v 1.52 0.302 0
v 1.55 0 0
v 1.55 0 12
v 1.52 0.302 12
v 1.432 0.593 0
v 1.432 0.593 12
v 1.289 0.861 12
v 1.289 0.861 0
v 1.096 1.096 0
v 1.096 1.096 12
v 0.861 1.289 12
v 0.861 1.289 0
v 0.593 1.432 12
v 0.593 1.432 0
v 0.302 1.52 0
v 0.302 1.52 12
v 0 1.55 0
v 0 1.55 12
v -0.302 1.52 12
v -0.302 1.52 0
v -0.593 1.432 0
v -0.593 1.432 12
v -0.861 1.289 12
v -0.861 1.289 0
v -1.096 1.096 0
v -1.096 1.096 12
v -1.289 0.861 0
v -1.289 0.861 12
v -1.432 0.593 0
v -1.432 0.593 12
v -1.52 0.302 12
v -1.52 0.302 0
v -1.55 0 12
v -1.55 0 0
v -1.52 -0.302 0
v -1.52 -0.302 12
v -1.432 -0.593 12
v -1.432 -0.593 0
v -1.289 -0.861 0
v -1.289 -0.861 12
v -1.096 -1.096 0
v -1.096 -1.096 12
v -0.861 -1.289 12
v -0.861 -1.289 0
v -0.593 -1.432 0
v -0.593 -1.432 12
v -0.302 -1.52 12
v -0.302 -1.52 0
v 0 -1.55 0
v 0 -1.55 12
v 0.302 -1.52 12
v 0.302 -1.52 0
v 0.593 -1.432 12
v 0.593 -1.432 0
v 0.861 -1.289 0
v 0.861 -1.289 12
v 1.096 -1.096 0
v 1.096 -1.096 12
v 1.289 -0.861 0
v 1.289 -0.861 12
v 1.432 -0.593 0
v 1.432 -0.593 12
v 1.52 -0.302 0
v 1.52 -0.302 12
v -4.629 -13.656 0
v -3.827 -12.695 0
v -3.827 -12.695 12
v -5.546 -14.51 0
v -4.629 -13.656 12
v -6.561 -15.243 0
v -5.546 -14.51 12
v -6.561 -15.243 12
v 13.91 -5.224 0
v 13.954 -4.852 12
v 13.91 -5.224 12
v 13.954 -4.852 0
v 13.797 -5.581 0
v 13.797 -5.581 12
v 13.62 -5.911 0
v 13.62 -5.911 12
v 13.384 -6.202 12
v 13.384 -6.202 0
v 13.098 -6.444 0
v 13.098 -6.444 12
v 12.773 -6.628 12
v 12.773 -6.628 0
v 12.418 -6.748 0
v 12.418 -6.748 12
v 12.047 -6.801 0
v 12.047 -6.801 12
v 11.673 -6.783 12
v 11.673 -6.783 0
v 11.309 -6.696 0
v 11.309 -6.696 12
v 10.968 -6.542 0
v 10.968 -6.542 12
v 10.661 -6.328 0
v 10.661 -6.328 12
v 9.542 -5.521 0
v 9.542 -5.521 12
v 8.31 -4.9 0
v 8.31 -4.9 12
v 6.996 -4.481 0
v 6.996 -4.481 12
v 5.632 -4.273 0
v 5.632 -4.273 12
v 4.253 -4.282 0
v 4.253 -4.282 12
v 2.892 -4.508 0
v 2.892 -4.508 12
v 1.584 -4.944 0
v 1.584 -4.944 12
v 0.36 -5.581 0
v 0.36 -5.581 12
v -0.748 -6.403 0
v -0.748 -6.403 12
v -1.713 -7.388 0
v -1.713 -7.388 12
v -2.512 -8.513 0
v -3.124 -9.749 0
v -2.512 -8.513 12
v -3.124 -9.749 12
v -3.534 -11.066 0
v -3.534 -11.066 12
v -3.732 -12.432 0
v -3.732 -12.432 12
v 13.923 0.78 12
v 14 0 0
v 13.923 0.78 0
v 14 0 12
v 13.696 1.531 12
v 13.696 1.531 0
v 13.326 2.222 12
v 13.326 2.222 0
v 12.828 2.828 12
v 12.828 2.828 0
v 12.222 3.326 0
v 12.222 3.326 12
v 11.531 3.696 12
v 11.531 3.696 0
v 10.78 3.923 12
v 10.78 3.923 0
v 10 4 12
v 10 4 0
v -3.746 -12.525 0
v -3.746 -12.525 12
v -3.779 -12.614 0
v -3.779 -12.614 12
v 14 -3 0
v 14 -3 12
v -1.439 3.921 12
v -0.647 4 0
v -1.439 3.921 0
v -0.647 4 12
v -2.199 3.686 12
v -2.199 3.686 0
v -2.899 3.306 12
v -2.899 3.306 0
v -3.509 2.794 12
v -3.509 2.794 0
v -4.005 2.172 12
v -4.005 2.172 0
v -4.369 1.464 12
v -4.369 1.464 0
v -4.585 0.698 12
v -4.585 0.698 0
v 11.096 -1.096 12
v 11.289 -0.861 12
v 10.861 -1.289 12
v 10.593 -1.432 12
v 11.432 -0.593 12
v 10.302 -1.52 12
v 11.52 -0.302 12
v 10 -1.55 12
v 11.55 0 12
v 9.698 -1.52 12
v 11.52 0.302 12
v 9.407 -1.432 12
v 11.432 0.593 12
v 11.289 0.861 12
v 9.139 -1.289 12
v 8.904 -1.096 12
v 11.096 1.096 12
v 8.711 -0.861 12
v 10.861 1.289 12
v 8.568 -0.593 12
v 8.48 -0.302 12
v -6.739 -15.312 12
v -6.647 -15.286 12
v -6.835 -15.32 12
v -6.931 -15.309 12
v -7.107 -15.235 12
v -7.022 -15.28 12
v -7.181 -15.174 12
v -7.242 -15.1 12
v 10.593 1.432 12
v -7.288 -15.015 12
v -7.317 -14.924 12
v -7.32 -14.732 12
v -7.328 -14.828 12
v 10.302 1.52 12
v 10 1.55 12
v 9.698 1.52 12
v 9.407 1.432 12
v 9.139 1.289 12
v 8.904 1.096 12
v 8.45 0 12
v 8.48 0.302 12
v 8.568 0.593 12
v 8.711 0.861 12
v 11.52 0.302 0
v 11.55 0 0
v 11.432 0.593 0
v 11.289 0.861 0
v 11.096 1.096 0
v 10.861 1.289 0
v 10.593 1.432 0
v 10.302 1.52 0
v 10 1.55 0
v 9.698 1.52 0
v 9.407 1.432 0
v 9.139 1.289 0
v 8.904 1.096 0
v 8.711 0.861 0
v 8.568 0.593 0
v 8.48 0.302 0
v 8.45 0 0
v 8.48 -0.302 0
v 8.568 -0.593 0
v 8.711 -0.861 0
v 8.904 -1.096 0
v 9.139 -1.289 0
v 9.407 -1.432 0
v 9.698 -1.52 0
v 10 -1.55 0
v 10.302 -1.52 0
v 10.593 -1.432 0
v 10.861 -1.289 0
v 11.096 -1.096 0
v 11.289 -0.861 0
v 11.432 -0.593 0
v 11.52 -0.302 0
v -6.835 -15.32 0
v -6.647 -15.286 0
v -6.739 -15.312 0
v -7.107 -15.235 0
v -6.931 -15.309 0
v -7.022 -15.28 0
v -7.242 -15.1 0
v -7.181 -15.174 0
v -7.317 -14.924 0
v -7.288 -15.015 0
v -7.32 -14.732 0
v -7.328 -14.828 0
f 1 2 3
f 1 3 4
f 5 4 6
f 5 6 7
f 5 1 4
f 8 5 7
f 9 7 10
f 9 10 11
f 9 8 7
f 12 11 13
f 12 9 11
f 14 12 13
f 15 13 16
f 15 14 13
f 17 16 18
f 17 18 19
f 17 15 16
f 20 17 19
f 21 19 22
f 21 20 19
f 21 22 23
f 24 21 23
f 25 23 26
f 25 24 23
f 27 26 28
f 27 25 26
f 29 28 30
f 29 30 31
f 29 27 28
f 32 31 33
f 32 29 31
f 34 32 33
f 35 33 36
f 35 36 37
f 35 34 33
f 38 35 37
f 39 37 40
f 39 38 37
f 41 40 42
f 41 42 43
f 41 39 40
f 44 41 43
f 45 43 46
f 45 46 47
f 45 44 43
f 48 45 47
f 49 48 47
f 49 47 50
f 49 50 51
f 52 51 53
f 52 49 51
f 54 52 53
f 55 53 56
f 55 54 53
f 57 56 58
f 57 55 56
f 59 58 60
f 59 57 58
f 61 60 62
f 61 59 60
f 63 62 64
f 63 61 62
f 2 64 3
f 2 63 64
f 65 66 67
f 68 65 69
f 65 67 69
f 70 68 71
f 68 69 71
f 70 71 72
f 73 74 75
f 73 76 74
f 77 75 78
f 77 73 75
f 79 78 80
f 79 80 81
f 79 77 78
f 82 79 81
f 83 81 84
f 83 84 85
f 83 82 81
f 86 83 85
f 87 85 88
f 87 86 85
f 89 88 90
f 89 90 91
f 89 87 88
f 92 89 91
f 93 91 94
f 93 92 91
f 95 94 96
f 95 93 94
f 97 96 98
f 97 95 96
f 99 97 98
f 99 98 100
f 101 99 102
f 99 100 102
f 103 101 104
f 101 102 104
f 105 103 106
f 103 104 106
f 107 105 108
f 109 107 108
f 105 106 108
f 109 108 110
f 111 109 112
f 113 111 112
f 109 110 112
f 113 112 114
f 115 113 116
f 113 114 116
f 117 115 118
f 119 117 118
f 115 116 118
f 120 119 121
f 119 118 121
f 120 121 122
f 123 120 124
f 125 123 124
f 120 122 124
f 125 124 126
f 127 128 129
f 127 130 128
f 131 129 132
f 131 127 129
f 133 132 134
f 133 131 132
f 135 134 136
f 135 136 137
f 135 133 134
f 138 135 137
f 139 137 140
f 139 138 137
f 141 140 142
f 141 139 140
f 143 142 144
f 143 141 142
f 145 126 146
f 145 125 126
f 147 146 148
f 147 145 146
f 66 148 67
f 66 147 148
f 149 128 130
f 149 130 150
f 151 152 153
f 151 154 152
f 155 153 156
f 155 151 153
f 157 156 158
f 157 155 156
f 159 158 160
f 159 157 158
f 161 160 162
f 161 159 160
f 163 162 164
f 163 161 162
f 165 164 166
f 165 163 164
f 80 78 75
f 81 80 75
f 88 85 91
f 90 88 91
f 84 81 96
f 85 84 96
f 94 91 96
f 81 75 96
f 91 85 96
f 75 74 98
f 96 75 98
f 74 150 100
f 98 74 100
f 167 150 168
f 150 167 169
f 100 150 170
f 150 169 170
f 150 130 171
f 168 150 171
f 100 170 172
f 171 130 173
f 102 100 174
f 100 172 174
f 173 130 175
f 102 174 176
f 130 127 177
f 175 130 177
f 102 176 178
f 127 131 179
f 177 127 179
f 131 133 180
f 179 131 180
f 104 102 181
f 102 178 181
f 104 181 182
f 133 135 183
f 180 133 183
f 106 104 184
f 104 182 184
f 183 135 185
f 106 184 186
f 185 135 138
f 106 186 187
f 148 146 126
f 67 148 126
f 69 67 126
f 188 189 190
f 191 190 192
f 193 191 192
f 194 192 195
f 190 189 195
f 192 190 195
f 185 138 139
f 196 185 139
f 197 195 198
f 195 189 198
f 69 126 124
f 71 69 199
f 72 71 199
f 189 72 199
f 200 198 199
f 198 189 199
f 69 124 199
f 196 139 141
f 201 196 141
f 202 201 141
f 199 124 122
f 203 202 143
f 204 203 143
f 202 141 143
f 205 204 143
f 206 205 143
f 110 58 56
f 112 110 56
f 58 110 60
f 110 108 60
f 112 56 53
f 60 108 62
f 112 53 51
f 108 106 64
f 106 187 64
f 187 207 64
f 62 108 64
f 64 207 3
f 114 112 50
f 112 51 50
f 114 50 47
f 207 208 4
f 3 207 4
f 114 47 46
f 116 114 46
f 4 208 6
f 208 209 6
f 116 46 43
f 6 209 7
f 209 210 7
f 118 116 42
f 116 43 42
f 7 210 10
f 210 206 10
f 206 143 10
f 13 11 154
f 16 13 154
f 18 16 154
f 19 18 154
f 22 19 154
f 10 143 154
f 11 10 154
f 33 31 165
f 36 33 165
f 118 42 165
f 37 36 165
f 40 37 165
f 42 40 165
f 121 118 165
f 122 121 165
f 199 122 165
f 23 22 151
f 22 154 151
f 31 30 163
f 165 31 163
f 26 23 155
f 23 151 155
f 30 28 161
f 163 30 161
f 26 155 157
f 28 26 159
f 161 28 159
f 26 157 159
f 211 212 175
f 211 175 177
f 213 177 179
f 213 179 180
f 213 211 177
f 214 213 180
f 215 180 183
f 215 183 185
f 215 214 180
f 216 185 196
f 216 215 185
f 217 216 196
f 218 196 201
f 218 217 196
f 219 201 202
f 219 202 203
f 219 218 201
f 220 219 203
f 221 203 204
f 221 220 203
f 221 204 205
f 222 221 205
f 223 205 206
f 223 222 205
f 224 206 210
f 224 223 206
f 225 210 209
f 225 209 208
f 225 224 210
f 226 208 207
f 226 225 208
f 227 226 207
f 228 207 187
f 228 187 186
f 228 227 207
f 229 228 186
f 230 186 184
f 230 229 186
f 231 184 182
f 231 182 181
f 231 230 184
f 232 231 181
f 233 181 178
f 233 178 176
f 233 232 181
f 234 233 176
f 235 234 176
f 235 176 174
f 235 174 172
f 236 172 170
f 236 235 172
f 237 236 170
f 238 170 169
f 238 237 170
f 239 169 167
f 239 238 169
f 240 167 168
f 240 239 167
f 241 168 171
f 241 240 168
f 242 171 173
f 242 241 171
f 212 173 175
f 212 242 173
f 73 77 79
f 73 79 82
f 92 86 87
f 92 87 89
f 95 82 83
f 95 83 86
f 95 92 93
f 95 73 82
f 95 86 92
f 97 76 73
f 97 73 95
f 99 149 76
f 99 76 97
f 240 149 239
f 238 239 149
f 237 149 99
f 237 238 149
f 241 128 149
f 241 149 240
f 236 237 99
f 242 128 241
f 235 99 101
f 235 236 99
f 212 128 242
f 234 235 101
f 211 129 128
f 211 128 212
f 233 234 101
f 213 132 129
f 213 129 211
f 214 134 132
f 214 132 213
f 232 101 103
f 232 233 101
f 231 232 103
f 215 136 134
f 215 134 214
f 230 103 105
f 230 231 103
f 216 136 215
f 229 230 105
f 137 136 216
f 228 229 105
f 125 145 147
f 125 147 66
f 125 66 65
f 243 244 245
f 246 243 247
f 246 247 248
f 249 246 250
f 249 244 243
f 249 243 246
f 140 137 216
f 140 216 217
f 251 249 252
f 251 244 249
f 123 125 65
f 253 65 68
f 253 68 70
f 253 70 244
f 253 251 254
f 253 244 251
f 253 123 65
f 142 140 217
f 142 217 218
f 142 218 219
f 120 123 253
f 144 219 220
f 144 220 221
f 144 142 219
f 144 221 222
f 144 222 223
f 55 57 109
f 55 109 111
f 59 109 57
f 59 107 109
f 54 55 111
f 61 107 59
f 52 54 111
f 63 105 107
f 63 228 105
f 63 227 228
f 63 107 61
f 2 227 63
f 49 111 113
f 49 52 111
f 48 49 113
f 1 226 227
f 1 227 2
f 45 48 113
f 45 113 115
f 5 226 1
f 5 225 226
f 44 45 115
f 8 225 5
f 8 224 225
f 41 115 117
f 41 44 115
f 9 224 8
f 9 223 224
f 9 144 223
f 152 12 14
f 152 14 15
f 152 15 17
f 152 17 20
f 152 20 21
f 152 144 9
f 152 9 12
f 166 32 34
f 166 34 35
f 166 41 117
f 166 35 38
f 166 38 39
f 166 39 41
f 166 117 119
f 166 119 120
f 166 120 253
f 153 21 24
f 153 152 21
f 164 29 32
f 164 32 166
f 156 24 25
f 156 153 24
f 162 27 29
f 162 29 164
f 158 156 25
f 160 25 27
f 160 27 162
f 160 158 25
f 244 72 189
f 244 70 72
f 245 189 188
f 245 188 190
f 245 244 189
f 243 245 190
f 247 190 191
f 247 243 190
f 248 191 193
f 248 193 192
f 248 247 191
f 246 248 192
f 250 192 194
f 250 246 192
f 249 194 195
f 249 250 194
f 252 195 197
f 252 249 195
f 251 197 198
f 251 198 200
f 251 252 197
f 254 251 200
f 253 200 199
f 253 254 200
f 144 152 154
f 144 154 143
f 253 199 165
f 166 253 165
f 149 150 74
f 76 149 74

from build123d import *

# Parameters (mm, degrees)
SKETCH_1_R      = 1.5499999999999998
SKETCH_1_R_2    = 1.5499999999999994
EXTRUDE_1_DEPTH = 12
EXTRUDE_2_DEPTH = 12
FILLET_1_R      = 0.5
FILLET_2_R      = 4
FILLET_3_R      = 2


with BuildPart() as part:
    # 草图1 → 凸台-拉伸1 (new body)
    with BuildSketch(Plane.XY):
        Polygon((14.000000000000002, -2.9999999999999982), (-4.000000000000002, -3.0000000000000004), (-4.000000000000002, 4), (14.000000000000002, 4.000000000000002), align=None)
        Circle(SKETCH_1_R, mode=Mode.SUBTRACT)
        with Locations((10, 0)):
            Circle(SKETCH_1_R_2, mode=Mode.SUBTRACT)
    extrude(amount=EXTRUDE_1_DEPTH)

    # 草图2 → 凸台-拉伸2 (add)
    with BuildSketch(Plane.XY.offset(12)):
        with BuildLine():
            Line((-4.000000000000002, 4), (-4.000000000000002, -3.0000000000000004))
            Line((-4.000000000000002, -3.0000000000000004), (14.000000000000002, -2.9999999999999982))
            Line((14.000000000000002, -2.9999999999999982), (13.747325070832083, -13.216342563780504))
            ThreePointArc((13.747325070832083, -13.216342563780504), (5.32150522875723, -4.255908601356449), (-3.7395934787153213, -12.573378590451934))
            ThreePointArc((-3.7395934787153213, -12.573378590451934), (-5.421370715664583, -14.406478038174821), (-7.50358636440358, -15.767729760711498))
            Line((-7.50358636440358, -15.767729760711498), (-4.000000000000002, 4))
        make_face()
    extrude(amount=-EXTRUDE_2_DEPTH)

    # 圆角1
    fillet_1_edges = [part.edges().sort_by_distance(p)[0] for p in [
        (-7.50358636440358, -15.7677297607115, 6),
        (-3.7395934787153218, -12.573378590451934, 6),
    ]]
    fillet(fillet_1_edges, radius=FILLET_1_R)

    # 圆角2
    fillet_2_edges = [part.edges().sort_by_distance(p)[0] for p in [
        (-4.000000000000002, 4, 6),
        (14.000000000000002, 4.000000000000002, 6),
    ]]
    fillet(fillet_2_edges, radius=FILLET_2_R)

    # 圆角3
    fillet_3_edges = [part.edges().sort_by_distance(p)[0] for p in [
        (13.747325070832083, -13.216342563780504, 6),
    ]]
    fillet(fillet_3_edges, radius=FILLET_3_R)


solid = part.part
